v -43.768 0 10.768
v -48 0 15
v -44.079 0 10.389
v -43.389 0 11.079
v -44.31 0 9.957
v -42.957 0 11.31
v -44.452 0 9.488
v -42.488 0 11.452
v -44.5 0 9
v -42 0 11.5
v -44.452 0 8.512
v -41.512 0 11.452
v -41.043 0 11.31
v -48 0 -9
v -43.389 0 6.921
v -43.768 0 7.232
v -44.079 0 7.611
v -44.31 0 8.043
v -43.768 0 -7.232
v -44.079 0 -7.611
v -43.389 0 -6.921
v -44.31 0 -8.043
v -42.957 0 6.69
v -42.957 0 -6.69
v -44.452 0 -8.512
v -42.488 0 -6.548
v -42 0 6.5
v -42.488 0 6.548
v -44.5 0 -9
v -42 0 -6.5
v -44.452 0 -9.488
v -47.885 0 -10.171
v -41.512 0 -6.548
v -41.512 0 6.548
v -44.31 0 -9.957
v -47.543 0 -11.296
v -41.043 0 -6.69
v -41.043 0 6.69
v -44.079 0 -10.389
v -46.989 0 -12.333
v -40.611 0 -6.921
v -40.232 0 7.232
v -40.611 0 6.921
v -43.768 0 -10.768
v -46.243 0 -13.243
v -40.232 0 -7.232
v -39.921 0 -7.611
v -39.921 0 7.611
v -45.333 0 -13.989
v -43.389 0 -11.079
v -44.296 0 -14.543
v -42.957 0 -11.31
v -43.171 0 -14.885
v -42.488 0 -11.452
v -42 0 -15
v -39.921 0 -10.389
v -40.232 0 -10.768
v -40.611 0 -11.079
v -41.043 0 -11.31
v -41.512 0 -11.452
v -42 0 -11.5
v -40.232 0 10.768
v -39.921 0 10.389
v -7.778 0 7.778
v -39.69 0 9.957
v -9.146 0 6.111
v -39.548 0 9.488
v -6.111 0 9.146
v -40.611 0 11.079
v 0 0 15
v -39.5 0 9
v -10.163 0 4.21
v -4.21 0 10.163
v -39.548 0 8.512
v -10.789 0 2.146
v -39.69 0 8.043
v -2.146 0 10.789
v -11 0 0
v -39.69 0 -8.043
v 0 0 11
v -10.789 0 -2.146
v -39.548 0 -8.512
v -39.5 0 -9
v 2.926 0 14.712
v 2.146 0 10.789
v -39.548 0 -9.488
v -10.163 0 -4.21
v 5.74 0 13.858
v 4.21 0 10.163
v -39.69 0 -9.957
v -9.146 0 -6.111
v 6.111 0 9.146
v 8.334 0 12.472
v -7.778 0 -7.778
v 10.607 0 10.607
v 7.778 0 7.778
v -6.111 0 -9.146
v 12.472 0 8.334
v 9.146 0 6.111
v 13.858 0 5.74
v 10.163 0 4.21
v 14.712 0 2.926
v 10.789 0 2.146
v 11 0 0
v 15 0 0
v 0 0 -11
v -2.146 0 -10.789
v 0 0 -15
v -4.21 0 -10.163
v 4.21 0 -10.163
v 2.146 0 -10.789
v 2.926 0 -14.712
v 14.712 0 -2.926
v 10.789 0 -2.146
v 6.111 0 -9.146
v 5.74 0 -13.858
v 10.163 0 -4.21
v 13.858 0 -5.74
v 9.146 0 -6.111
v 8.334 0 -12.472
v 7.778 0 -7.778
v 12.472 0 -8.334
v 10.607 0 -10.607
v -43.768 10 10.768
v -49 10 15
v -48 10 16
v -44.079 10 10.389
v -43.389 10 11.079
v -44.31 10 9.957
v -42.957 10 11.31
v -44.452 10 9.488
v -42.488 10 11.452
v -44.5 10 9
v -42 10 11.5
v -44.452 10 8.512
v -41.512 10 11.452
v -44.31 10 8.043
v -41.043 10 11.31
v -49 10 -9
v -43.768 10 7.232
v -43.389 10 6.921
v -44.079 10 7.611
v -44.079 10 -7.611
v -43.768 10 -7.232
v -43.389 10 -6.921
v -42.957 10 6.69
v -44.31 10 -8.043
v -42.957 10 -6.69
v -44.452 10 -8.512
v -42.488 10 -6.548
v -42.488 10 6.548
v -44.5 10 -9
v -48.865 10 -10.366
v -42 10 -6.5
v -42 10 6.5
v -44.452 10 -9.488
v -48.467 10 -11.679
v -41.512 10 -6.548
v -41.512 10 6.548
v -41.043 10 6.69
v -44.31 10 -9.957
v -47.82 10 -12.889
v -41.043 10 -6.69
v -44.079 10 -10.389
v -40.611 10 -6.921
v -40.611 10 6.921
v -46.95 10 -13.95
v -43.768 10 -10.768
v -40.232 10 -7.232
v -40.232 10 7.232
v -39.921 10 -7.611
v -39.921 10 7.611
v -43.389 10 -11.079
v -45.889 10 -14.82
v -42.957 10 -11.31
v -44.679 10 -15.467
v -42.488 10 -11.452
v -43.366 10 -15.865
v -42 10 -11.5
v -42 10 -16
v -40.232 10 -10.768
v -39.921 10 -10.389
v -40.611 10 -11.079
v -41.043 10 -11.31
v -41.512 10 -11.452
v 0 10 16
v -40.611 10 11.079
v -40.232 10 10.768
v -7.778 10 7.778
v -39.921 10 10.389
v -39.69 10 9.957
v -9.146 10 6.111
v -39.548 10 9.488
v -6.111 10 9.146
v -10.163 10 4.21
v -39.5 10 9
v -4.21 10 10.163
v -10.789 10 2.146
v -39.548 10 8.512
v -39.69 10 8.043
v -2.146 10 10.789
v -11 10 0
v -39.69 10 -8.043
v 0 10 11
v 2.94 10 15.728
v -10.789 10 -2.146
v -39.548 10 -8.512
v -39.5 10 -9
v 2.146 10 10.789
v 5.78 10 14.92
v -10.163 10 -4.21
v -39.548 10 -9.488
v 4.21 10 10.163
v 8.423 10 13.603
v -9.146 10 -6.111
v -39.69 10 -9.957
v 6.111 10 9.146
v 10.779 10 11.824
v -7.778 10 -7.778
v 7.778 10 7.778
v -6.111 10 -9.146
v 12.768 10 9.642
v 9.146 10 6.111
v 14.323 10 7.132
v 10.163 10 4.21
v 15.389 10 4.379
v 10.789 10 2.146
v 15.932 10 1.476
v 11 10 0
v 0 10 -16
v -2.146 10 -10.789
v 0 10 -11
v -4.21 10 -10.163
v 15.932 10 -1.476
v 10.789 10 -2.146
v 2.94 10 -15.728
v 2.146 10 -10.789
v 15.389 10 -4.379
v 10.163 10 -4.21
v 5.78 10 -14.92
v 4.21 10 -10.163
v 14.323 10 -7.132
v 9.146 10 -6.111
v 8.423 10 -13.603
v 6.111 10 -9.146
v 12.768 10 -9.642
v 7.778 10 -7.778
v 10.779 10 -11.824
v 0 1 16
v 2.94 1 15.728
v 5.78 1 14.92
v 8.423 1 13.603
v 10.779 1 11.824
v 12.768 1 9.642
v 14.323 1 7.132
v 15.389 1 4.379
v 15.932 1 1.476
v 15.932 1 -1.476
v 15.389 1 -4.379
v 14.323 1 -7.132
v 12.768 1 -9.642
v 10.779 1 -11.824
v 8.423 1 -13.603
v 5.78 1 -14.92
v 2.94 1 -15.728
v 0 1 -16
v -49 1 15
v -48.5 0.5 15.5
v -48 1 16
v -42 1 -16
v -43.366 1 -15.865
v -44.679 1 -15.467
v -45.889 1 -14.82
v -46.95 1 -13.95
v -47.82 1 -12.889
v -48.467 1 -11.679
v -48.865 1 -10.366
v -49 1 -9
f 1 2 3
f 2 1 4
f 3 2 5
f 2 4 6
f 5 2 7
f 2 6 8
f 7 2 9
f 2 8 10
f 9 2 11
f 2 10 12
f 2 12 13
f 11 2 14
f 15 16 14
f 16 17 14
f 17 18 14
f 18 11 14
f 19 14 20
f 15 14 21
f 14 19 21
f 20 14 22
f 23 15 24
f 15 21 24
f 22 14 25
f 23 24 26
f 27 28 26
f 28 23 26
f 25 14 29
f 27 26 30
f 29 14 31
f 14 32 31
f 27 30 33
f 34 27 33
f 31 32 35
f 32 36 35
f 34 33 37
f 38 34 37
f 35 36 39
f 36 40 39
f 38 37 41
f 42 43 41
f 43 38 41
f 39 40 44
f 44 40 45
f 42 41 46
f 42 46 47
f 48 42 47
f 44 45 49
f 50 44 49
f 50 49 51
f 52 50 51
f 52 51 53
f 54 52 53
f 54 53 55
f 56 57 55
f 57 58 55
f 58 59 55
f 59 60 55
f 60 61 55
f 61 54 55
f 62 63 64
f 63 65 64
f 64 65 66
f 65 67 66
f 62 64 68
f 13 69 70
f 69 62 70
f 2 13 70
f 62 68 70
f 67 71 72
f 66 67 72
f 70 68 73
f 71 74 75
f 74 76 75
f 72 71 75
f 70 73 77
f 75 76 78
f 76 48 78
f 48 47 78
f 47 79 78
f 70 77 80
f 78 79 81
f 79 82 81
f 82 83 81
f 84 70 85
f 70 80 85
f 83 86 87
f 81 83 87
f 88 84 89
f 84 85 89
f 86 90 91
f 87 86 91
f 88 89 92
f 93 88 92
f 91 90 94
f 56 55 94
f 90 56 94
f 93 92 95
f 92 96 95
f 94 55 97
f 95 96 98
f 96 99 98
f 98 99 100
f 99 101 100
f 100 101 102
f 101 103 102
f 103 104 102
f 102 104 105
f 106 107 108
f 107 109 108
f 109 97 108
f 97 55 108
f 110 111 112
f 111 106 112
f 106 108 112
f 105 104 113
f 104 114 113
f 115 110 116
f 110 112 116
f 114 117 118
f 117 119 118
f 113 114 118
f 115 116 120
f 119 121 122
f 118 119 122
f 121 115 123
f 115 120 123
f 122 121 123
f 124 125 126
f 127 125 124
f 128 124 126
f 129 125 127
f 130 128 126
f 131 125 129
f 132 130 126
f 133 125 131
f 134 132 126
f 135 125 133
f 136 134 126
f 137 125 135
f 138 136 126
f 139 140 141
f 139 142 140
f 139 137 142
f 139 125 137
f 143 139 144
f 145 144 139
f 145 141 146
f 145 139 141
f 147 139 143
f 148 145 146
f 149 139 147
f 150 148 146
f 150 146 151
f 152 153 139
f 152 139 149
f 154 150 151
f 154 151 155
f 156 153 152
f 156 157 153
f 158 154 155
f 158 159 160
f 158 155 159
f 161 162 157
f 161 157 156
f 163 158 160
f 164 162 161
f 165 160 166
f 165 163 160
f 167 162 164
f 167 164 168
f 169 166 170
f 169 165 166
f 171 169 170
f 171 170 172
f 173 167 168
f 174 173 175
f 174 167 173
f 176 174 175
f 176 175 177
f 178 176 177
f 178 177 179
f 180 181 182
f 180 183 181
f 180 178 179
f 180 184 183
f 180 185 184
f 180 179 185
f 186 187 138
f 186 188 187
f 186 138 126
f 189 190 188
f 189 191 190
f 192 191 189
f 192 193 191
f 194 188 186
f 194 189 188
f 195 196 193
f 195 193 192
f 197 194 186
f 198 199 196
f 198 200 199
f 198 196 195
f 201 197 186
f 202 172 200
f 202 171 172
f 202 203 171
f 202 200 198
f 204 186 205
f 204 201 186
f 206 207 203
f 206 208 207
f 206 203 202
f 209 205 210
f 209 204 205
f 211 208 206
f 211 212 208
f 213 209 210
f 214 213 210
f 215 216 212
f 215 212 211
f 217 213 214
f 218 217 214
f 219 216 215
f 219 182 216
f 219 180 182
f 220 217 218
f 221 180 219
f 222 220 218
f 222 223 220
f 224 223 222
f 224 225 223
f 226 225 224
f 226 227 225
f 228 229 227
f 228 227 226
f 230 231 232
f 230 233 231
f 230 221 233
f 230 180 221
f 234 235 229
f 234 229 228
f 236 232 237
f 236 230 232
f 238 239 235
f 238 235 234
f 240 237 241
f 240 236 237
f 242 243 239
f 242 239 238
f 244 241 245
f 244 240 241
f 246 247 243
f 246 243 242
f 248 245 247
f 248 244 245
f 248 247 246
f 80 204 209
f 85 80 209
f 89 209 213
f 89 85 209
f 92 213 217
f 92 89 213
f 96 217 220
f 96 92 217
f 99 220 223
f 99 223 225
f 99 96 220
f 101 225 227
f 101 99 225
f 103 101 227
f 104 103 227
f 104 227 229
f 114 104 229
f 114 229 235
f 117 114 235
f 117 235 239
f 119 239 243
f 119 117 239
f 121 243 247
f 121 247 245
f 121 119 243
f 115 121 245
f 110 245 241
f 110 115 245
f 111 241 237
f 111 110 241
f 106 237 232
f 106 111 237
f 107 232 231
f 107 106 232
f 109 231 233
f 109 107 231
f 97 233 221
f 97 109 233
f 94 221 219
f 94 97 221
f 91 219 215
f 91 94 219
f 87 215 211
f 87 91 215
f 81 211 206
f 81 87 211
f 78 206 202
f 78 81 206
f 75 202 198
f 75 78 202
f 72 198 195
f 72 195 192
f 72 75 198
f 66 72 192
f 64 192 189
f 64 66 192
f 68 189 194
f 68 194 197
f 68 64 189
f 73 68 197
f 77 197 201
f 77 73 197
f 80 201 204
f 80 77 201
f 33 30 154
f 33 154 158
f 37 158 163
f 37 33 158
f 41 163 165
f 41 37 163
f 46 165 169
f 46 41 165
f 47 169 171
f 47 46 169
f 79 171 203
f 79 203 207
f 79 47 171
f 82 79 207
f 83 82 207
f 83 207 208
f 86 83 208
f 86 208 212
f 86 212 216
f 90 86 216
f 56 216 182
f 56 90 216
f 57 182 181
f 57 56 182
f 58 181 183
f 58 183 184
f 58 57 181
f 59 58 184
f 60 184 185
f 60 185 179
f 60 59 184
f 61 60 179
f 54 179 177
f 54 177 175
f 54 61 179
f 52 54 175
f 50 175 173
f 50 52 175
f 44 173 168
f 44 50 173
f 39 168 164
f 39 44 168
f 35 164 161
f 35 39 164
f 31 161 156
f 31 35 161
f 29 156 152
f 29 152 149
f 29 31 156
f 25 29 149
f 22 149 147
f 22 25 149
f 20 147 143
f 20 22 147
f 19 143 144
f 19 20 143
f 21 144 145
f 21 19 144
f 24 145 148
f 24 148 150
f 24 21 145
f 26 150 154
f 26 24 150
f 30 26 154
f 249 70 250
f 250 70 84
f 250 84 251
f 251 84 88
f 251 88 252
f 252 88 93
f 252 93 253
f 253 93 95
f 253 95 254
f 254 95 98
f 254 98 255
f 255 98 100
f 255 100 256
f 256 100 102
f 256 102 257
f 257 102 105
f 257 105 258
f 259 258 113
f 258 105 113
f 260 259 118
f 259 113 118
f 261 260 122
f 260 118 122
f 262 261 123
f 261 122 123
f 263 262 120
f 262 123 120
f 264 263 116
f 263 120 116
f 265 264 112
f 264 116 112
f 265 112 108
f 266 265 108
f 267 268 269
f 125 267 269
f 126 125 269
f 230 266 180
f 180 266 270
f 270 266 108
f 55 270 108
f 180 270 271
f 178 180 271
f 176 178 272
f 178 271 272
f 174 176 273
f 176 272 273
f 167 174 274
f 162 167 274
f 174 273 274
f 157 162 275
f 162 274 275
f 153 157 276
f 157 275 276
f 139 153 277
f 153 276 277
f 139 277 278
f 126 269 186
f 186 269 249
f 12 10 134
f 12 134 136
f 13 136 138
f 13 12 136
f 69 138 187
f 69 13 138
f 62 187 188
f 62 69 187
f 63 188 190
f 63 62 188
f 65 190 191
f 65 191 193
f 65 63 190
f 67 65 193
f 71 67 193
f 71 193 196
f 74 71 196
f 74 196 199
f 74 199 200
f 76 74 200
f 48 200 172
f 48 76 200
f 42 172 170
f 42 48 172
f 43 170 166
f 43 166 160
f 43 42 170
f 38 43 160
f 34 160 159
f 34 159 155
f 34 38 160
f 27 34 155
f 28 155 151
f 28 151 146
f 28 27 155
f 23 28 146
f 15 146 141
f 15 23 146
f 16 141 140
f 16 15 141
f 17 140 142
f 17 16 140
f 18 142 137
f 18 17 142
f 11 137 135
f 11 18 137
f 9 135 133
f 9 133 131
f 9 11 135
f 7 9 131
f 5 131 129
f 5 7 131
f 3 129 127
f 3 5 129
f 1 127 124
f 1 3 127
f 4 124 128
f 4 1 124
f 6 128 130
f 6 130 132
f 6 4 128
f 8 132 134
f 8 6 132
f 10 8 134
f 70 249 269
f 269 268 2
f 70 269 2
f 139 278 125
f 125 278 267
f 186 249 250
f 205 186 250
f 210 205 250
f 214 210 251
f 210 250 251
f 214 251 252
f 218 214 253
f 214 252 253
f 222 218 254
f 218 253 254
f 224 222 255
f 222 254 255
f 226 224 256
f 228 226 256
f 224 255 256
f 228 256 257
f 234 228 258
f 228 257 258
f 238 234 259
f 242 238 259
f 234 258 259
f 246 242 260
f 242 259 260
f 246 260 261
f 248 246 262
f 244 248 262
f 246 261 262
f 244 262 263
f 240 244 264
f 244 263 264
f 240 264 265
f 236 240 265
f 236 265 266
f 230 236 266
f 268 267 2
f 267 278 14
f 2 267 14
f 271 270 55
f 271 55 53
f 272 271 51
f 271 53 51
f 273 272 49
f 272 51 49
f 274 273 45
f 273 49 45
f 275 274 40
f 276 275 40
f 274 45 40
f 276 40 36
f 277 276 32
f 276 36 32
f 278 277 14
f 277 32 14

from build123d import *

# Parameters (mm, degrees)
SKETCH_1_R      = 11
SKETCH_1_R_2    = 2.5
EXTRUDE_1_DEPTH = 10
CHAMFER_1_SIZE  = 1


with BuildPart() as part:
    # 草图1 → 凸台-拉伸1 (new body)
    with BuildSketch(Plane(origin=(0, 0, 0), x_dir=(1, 0, 0), z_dir=(0, 1, 0))):
        with BuildLine():
            Line((0, 16), (-42, 16))
            ThreePointArc((-42, 16), (-46.949747468, 13.949747468), (-49, 9))
            Line((-49, 9), (-49, -15))
            Line((-49, -15), (-48, -16))
            Line((-48, -16), (0, -16))
            ThreePointArc((0, -16), (16, 0), (0, 16))
        make_face()
        with Locations(Location((0, 0, 0), (0, 0, 270))):
            Circle(SKETCH_1_R, mode=Mode.SUBTRACT)
        with Locations(Location((-42, 9, 0), (0, 0, 270))):
            Circle(SKETCH_1_R_2, mode=Mode.SUBTRACT)
        with Locations(Location((-42, -9, 0), (0, 0, 270))):
            Circle(SKETCH_1_R_2, mode=Mode.SUBTRACT)
    extrude(amount=EXTRUDE_1_DEPTH)

    # 倒角1
    # the kernel refuses this chamfer: 1 mm, written as the material it takes off along each edge
    with BuildSketch(Plane(origin=(-50.571682988, 0, 16), x_dir=(0, 0.9996219169112968, 0.02749587661058563), z_dir=(1, 0, 0))) as chamfer_1_piece_1:
        Polygon((CHAMFER_1_SIZE * 0.999621916911, -CHAMFER_1_SIZE * 0.0274958766106), (-CHAMFER_1_SIZE * 0.0274958766106, -CHAMFER_1_SIZE * 0.999621916911), (0, 0), align=None)
    extrude(amount=50.571682988, mode=Mode.SUBTRACT)
    with BuildSketch(Plane(origin=(0, 0, 0), x_dir=(0, 0, 1), z_dir=(-1, 0, 0))) as chamfer_1_piece_2:
        Polygon((16, CHAMFER_1_SIZE), (16 - CHAMFER_1_SIZE, 0), (16, 0), align=None)
    revolve(axis=Axis((0, 0, 0), (0, 1, 0)), revolution_arc=180, mode=Mode.SUBTRACT)
    with BuildSketch(Plane(origin=(0, 0, -16), x_dir=(0, 0.9996219169112968, -0.02749587661058563), z_dir=(-1, 0, 0))) as chamfer_1_piece_3:
        Polygon((CHAMFER_1_SIZE * 0.999621916911, -CHAMFER_1_SIZE * 0.0274958766106), (-CHAMFER_1_SIZE * 0.0274958766106, -CHAMFER_1_SIZE * 0.999621916911), (0, 0), align=None)
    extrude(amount=42, mode=Mode.SUBTRACT)
    with BuildSketch(Plane(origin=(-42, 0, -9), x_dir=(0, 0, -1), z_dir=(1, 0, 0))) as chamfer_1_piece_4:
        Polygon((7, CHAMFER_1_SIZE), (7 - CHAMFER_1_SIZE, 0), (7, 0), align=None)
    revolve(axis=Axis((-42, 0, -9), (0, 1, 0)), revolution_arc=90, mode=Mode.SUBTRACT)
    with BuildSketch(Plane(origin=(-49, 0, -9), x_dir=(-0.02749587661058908, 0.9996219169112968, 0), z_dir=(0, 0, 1))) as chamfer_1_piece_5:
        Polygon((CHAMFER_1_SIZE * 0.999621916911, -CHAMFER_1_SIZE * 0.0274958766106), (-CHAMFER_1_SIZE * 0.0274958766106, -CHAMFER_1_SIZE * 0.999621916911), (0, 0), align=None)
    extrude(amount=26.571682988, mode=Mode.SUBTRACT)


solid = part.part
